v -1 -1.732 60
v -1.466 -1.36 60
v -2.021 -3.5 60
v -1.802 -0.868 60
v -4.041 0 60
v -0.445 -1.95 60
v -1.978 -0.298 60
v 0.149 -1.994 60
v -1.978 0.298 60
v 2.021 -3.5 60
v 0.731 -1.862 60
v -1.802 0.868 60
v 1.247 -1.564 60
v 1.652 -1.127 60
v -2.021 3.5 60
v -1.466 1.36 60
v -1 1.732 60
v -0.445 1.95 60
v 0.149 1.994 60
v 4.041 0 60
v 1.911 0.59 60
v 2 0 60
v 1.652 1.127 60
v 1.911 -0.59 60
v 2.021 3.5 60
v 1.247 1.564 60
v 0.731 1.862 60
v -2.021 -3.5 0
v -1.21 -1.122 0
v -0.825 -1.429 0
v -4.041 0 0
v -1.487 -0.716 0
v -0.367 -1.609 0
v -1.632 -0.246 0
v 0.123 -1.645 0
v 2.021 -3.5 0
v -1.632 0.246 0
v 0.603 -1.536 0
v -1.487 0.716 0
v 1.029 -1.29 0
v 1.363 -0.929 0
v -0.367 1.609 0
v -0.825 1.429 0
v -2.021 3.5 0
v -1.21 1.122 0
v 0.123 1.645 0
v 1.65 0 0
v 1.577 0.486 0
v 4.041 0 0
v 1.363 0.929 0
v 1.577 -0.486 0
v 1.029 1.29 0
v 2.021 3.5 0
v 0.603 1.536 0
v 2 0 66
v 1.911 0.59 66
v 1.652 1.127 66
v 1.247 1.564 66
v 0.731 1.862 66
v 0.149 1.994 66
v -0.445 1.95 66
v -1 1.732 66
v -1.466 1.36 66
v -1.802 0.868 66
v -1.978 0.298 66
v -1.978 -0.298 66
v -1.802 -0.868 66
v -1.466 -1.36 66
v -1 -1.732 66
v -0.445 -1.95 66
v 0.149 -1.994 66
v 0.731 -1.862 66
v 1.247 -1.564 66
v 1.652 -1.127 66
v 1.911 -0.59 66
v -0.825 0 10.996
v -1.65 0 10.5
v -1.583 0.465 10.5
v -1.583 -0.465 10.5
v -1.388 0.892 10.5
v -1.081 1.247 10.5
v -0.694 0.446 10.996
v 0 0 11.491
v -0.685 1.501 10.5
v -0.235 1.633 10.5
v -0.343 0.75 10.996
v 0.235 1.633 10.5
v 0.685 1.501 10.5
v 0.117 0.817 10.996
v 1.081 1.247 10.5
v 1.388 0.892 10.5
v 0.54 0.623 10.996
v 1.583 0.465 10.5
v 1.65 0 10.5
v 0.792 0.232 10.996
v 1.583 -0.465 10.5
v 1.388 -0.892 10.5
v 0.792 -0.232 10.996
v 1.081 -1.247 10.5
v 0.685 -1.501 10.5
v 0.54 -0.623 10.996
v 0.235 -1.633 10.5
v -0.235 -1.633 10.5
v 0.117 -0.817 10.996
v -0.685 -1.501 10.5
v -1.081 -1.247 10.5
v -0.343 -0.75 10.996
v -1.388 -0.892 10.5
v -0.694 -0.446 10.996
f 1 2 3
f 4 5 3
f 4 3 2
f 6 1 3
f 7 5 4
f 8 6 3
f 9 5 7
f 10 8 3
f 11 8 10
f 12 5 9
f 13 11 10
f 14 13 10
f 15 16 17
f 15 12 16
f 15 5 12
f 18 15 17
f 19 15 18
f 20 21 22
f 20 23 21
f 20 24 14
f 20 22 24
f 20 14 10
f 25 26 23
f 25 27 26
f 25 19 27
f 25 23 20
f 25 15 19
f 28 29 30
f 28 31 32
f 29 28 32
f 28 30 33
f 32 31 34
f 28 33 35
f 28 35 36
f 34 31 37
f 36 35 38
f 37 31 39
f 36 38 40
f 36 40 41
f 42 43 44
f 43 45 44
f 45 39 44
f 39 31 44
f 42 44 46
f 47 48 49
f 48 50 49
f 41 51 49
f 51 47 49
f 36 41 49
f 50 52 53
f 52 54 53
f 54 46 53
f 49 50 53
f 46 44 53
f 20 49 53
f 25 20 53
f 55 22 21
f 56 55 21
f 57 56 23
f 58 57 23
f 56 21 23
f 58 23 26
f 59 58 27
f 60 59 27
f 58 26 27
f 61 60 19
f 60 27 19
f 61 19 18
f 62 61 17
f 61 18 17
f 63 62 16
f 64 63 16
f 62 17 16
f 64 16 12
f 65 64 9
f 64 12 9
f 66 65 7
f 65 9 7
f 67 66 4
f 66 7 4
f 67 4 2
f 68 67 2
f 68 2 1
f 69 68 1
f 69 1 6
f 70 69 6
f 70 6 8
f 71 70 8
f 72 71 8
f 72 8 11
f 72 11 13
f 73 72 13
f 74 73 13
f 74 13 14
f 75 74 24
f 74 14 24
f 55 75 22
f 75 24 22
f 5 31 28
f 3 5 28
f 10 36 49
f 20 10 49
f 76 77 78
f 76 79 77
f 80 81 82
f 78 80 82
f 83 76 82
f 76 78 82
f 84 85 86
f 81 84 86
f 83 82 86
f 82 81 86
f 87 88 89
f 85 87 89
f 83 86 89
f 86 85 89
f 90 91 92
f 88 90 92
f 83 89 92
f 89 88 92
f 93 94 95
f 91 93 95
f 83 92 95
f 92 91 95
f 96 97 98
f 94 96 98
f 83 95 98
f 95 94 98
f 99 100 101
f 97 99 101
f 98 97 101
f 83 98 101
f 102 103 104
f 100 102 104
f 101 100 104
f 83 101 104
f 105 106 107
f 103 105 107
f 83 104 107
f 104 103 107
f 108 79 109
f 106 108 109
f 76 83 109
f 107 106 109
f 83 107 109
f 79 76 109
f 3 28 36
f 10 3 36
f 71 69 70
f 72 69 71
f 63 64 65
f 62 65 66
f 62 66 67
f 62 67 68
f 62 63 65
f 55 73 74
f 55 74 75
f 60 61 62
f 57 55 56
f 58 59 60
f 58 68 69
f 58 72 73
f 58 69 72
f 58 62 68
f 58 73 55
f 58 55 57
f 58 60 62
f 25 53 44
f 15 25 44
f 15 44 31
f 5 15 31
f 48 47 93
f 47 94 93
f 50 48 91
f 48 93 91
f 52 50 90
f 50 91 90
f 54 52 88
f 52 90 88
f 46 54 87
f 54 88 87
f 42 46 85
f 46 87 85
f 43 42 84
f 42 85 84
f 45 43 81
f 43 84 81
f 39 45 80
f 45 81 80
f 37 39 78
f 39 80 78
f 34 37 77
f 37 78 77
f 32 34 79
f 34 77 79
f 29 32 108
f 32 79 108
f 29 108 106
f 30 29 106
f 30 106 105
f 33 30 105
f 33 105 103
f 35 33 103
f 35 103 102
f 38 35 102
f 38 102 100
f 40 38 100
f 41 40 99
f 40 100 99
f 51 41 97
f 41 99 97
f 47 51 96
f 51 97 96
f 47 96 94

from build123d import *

# Parameters (mm, degrees)
EXTRUDE_1_DEPTH = 60
SKETCH_2_R      = 2
EXTRUDE_2_DEPTH = 6
M4X0_7_1_D      = 3.3
M4X0_7_1_DEPTH  = 10.5
M4X0_7_1_TIP    = 0.991420021


with BuildPart() as part:
    # 草圖1 → 填料-伸長1 (new body)
    with BuildSketch(Plane.XY):
        Polygon((4.041451884, 0), (2.020725942, 3.5), (-2.020725942, 3.5), (-4.041451884, 0), (-2.020725942, -3.5), (2.020725942, -3.5), align=None)
    extrude(amount=EXTRUDE_1_DEPTH)

    # 草圖2 → 填料-伸長2 (add)
    with BuildSketch(Plane.XY.offset(60)):
        Circle(SKETCH_2_R)
    extrude(amount=EXTRUDE_2_DEPTH)

    # M4x0.7 螺紋孔1
    with Locations(Plane(origin=(0, 0, 0), x_dir=(-1, 0, 0), z_dir=(0, 0, -1))):
        with Locations((0, 0)):
            Hole(M4X0_7_1_D / 2, depth=M4X0_7_1_DEPTH)
            with Locations((0, 0, -(M4X0_7_1_DEPTH + M4X0_7_1_TIP / 2))):  # 118° drill point
                Cone(0, M4X0_7_1_D / 2, M4X0_7_1_TIP, mode=Mode.SUBTRACT)


solid = part.part
